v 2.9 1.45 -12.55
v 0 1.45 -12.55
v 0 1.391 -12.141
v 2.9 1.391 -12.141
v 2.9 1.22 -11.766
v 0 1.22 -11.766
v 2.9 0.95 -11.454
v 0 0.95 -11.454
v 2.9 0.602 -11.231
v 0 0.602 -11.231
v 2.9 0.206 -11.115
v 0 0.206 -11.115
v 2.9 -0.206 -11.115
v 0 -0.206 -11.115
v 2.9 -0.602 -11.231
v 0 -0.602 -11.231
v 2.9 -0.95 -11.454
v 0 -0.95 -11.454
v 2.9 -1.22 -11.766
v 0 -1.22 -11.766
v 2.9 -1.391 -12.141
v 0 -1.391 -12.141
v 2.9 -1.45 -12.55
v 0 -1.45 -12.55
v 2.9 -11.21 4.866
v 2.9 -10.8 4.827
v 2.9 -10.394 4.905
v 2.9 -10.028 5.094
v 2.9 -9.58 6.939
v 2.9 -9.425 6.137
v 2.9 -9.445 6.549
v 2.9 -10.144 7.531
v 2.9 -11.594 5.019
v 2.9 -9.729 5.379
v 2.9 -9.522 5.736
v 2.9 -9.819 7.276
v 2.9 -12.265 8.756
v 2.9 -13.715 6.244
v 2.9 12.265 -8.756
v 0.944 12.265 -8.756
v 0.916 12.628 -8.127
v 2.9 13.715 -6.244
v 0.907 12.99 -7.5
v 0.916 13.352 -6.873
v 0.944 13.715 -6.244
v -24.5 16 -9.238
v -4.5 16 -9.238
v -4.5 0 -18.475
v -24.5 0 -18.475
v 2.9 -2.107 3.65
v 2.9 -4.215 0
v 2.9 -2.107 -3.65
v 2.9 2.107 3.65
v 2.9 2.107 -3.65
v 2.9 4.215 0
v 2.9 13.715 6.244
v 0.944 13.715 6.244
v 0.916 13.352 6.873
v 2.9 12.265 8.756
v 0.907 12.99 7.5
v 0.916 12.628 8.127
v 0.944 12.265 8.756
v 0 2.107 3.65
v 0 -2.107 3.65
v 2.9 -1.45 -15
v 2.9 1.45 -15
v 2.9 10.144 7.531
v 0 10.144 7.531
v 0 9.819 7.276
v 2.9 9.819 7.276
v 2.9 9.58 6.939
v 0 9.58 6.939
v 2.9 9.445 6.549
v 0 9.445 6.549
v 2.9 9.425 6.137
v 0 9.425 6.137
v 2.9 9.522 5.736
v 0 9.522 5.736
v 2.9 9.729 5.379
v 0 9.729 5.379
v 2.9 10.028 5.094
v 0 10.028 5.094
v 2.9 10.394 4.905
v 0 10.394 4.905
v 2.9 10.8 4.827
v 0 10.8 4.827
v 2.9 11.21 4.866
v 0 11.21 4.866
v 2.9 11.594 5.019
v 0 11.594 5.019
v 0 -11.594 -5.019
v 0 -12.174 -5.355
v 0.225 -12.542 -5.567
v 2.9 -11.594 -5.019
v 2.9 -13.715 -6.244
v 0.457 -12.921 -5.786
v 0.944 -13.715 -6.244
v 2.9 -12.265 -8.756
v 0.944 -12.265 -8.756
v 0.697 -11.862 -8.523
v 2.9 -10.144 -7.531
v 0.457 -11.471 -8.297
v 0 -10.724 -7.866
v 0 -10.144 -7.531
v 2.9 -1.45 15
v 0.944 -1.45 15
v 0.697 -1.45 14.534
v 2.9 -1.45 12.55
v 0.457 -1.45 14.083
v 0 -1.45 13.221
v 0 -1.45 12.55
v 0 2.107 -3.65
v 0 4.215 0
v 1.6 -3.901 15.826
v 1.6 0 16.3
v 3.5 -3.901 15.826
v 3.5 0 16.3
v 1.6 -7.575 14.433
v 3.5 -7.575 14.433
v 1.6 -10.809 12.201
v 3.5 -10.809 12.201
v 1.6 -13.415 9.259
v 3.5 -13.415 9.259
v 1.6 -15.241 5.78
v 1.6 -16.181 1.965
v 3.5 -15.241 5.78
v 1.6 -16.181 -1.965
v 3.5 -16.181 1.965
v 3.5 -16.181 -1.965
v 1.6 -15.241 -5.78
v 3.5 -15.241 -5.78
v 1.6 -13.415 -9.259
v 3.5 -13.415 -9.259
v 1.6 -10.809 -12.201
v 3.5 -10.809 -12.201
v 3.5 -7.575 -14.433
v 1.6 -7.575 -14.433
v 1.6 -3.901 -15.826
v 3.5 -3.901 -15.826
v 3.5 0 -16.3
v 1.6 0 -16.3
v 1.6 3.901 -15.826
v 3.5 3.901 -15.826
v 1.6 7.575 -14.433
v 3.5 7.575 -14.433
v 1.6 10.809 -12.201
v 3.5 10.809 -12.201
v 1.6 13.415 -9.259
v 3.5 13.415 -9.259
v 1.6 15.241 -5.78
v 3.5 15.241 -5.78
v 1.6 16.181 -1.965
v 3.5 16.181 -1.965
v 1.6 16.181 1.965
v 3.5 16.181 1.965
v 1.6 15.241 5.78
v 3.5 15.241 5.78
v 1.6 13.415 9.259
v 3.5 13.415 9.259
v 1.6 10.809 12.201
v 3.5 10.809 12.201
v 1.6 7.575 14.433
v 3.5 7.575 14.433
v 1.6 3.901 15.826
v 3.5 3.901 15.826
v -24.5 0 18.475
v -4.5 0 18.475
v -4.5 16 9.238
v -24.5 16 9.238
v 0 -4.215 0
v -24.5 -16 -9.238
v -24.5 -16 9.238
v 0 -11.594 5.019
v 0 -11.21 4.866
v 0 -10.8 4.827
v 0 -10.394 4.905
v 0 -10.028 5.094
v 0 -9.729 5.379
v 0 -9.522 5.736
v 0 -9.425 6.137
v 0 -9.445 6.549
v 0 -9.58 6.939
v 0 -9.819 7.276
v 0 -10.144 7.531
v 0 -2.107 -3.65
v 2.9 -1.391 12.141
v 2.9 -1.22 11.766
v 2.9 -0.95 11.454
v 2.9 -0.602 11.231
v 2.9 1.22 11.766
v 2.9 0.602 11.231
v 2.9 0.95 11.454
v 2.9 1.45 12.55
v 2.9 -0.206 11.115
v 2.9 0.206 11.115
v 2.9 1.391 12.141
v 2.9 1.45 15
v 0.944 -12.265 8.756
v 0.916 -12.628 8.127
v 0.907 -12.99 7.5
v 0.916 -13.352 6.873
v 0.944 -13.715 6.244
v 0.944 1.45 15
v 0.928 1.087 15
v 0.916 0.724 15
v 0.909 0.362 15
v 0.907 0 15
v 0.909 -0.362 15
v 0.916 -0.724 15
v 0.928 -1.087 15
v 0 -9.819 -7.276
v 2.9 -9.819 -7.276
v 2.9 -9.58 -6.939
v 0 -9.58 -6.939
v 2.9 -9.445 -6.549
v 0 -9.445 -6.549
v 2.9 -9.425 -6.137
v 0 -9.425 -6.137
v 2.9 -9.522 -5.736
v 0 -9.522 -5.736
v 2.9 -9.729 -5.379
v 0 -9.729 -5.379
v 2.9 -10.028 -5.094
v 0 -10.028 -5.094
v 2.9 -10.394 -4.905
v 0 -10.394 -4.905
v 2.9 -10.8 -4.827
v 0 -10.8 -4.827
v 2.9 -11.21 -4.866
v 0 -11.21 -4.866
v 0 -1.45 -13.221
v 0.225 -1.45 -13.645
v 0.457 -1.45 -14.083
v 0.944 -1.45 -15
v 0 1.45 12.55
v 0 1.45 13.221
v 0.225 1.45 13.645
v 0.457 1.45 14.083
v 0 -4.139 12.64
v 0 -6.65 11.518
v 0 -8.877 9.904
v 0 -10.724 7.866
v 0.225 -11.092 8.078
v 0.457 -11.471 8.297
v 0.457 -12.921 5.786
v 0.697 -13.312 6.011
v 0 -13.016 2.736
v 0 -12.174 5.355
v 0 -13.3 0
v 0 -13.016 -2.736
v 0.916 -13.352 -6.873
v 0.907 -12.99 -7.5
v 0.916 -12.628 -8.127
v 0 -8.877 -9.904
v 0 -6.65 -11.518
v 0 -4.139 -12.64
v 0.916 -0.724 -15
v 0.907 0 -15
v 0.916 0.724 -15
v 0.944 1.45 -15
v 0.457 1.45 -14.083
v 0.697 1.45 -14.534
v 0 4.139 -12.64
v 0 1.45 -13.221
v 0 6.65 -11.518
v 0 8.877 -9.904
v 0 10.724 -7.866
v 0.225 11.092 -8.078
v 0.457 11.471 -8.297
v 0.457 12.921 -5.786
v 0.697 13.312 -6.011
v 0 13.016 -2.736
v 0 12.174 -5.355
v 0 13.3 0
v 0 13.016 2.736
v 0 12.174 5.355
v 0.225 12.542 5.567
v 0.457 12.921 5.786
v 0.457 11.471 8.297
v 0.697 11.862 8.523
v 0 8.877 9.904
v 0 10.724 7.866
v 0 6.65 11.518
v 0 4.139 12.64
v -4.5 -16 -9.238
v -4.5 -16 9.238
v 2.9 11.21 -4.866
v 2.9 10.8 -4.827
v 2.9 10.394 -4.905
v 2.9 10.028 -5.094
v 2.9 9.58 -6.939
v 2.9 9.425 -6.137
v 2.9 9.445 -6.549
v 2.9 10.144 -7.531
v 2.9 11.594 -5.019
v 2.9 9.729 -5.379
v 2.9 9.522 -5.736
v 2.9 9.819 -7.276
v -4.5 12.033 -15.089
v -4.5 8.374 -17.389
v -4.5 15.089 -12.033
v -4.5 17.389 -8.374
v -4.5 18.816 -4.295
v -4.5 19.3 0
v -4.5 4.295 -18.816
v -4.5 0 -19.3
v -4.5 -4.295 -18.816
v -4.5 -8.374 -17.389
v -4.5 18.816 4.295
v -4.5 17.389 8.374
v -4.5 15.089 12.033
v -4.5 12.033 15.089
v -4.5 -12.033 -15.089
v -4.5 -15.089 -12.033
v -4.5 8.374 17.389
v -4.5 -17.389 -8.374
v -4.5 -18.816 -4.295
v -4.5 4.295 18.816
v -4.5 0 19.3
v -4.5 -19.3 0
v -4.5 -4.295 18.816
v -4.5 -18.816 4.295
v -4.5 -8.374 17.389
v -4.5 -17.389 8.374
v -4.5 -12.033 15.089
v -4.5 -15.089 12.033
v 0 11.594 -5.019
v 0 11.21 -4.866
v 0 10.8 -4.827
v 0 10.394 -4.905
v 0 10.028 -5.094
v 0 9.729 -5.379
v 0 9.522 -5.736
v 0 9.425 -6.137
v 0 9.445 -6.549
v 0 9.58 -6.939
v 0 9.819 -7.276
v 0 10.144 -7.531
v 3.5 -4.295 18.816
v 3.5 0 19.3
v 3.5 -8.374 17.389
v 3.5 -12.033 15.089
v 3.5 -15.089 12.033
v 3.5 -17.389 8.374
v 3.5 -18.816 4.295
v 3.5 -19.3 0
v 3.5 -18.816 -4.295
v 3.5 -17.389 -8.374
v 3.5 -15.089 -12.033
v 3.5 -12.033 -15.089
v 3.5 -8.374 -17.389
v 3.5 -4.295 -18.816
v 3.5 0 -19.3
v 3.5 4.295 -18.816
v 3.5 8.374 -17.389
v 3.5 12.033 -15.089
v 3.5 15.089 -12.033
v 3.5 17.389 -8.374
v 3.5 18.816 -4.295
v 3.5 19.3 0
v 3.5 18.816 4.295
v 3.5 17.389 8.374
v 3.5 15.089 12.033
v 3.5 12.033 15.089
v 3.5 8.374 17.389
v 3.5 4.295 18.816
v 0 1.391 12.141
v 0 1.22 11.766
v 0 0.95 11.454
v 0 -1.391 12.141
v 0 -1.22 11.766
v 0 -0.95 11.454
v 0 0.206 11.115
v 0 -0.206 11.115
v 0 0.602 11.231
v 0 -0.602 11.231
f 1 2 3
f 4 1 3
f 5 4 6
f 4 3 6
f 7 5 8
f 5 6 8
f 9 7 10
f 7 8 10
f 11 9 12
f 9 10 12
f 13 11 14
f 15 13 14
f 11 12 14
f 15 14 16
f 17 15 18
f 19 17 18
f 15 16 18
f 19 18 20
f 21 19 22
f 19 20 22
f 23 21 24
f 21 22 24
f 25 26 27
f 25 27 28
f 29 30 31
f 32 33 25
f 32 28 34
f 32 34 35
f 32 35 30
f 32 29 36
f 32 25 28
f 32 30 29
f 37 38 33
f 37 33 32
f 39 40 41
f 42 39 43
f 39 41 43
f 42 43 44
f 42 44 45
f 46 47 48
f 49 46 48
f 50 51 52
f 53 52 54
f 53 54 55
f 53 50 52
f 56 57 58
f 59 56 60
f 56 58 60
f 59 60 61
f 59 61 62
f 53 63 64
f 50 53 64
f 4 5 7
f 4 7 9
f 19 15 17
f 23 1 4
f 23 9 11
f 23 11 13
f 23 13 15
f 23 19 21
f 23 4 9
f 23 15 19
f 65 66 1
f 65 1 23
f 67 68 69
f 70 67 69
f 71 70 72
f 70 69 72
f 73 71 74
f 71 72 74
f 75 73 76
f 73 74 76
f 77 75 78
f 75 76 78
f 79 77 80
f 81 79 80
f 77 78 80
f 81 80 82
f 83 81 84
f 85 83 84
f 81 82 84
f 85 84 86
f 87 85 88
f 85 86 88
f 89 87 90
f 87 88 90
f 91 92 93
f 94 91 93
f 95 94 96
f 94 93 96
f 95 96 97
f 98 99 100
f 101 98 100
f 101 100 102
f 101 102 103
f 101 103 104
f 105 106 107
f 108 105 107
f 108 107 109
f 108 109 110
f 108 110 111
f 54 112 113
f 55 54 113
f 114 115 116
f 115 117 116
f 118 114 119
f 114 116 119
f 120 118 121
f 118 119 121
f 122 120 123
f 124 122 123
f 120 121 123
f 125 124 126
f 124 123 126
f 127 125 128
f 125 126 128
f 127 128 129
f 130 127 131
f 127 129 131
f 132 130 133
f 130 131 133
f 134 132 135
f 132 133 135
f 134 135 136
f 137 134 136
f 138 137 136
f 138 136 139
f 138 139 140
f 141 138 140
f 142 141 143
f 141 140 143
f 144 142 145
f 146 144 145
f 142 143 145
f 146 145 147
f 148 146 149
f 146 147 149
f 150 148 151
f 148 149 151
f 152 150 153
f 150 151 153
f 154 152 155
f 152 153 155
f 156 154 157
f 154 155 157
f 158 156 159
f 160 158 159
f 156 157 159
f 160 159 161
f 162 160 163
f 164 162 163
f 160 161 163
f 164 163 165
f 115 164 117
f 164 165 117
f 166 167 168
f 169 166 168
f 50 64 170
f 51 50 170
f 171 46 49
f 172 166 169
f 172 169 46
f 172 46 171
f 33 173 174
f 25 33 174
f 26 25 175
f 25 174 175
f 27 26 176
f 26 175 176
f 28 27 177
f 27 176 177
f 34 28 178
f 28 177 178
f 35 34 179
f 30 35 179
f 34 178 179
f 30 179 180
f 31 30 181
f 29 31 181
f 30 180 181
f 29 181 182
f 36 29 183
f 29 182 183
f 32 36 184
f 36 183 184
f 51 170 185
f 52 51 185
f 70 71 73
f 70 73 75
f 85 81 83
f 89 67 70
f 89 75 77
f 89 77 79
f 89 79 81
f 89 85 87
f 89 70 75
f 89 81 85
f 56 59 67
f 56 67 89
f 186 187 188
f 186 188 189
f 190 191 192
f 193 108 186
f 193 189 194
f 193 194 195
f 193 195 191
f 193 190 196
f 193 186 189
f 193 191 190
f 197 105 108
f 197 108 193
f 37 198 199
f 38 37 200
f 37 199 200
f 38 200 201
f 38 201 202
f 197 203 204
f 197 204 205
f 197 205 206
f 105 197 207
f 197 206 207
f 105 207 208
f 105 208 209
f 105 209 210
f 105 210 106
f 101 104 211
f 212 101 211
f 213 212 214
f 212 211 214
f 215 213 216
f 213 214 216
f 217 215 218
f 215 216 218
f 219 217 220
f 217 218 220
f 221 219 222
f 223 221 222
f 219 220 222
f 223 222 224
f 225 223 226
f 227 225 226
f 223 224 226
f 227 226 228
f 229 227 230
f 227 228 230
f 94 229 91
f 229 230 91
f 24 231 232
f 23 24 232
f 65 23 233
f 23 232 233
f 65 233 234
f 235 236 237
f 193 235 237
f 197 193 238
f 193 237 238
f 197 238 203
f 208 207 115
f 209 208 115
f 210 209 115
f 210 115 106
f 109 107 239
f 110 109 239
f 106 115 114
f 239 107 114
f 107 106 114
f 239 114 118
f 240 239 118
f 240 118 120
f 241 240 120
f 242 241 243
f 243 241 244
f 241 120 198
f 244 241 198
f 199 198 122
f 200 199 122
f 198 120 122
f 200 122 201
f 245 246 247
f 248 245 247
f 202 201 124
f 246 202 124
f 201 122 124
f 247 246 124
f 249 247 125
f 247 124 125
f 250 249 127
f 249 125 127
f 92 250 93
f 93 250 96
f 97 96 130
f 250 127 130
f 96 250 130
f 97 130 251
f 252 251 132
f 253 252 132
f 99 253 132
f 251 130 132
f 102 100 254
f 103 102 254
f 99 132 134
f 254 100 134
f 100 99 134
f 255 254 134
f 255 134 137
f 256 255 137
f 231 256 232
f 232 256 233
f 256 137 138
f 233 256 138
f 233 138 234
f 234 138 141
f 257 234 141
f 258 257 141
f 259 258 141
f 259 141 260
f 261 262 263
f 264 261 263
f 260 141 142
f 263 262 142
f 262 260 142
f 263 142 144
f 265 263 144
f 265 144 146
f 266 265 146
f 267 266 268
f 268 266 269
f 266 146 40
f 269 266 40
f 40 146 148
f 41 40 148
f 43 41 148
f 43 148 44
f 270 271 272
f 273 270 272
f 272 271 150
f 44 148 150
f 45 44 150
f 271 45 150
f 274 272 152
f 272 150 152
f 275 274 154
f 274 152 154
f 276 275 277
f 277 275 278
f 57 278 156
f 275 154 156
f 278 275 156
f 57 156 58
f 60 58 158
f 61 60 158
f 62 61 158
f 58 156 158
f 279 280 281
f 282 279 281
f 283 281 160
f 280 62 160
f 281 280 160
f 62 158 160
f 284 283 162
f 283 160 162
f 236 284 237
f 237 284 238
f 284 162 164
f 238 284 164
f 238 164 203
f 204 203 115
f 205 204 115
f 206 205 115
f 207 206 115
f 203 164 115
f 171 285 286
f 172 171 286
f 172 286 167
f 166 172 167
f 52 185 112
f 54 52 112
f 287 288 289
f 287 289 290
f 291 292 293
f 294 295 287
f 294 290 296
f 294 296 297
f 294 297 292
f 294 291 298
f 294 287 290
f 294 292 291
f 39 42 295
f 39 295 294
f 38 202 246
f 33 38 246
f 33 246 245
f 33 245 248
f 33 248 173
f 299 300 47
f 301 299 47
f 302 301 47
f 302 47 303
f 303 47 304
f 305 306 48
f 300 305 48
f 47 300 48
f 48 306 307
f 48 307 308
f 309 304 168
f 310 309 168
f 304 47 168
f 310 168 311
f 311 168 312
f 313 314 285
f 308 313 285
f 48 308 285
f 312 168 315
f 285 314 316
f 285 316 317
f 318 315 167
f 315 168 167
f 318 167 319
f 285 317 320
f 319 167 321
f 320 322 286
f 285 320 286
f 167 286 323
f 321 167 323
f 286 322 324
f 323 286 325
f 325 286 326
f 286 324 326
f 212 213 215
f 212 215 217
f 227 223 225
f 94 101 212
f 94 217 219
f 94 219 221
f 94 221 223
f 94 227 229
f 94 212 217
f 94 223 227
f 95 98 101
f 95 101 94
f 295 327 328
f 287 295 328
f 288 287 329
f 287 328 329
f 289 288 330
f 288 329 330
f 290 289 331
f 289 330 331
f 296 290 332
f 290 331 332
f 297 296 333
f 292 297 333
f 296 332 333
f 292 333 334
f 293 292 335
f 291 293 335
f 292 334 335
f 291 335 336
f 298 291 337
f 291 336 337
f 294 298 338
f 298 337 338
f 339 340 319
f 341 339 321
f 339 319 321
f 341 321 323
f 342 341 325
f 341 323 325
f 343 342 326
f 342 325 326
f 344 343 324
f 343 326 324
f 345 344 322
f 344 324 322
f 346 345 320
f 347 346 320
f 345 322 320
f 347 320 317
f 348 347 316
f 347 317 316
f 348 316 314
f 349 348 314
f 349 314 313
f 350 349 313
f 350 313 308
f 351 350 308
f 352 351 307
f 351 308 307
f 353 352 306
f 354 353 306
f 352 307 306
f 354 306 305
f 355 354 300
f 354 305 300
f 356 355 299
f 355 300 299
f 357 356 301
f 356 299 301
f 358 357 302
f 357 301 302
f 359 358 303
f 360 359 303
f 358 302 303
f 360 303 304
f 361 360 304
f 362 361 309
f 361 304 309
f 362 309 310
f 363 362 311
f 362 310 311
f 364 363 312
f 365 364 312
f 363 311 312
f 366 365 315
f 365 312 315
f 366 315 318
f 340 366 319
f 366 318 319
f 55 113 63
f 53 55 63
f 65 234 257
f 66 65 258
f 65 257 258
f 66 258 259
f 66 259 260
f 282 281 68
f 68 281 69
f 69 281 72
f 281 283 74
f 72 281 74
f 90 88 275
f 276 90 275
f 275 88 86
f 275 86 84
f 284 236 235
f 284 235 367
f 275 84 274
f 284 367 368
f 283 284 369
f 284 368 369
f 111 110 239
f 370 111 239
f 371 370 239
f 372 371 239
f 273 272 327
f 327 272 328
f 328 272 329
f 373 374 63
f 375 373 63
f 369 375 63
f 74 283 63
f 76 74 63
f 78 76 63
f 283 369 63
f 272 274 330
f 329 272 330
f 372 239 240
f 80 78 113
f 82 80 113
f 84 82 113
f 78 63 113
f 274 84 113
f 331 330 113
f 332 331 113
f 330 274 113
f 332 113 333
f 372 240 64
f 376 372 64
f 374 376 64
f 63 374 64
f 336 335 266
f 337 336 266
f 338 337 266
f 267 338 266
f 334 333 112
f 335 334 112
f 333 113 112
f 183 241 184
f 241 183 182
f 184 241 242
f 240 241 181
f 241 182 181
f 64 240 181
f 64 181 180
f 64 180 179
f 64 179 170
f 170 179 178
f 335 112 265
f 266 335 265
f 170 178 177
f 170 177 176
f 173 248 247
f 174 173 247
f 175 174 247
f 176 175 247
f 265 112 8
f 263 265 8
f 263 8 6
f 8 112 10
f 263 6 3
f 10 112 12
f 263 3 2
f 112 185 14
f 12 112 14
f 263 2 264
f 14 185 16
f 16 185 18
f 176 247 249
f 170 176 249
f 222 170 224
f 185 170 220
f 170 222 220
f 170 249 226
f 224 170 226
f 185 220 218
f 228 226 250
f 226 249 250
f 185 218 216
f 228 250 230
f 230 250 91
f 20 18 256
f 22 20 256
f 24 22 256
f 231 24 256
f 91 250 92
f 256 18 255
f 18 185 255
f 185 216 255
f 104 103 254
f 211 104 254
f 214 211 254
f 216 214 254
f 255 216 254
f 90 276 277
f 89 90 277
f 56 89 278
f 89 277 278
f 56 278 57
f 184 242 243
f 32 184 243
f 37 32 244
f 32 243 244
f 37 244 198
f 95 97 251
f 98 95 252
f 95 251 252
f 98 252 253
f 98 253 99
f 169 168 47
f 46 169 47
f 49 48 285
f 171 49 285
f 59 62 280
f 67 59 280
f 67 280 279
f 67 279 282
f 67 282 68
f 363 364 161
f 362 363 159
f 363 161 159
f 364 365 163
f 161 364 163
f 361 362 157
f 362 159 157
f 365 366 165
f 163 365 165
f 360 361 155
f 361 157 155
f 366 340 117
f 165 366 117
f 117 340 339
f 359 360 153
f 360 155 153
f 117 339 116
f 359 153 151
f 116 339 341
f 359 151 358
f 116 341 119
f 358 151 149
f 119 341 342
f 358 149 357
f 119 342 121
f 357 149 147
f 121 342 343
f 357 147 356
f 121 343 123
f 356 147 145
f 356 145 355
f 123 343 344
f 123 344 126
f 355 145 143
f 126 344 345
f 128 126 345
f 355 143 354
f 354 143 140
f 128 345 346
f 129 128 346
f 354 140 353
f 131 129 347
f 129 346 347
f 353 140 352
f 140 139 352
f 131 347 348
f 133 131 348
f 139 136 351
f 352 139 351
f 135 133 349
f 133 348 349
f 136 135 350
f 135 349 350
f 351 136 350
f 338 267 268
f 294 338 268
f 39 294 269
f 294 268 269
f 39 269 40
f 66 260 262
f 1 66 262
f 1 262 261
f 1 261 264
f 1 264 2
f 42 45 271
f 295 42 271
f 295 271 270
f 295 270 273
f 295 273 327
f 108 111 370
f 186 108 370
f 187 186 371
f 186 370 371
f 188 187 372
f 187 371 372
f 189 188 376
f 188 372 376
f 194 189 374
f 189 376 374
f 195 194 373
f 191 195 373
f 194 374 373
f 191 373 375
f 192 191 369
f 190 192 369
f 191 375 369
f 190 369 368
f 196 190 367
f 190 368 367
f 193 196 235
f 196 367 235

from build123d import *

# Parameters (mm, degrees)
F3_DEPTH        = 2.9
F5_DEPTH        = 20
F7_DEPTH        = 2.9
F7_COPIES_COUNT = 6


# Not quite as in the source:
# - a pattern or mirror of a feature is missing from the dataset's text; its kind, count and spacing are read off the source's solid


with BuildPart() as f1:
    # F0 (on Front) → F1 (revolve)
    with BuildSketch(Plane.XZ):
        Polygon((1.6, 16.3), (3.5, 16.3), (3.5, 19.3), (-4.5, 19.3), (-4.5, 0), (0, 0), (0, 13.3), align=None)
    revolve(axis=Axis((15.3209697455, 0, 0), (1, 0, 0)))

    # F2 (on face) → F3 (join)
    with BuildSketch(Plane.YZ):
        Polygon((-2.1073284825, 3.65), (-4.2146569651, 0), (-2.1073284825, -3.65), (2.1073284825, -3.65), (4.2146569651, 0), (2.1073284825, 3.65), align=None)
    extrude(amount=F3_DEPTH)

    # F4 (on face) → F5 (join)
    with BuildSketch(Plane(origin=(-4.5, 0, 0), x_dir=(0, -1, 0), z_dir=(-1, 0, 0))):
        Polygon((0, 18.4752086141), (-16, 9.237604307), (-16, -9.237604307), (0, -18.4752086141), (16, -9.237604307), (16, 9.237604307), align=None)
    extrude(amount=F5_DEPTH)

    # F6 (on face) → F7 (join)
    with BuildSketch(Plane.YZ):
        with BuildLine():
            Line((1.45, 15), (-1.45, 15))
            Line((-1.45, 15), (-1.45, 12.55))
            ThreePointArc((-1.45, 12.55), (0, 11.1), (1.45, 12.55))
            Line((1.45, 12.55), (1.45, 15))
        make_face()
    f7 = extrude(amount=F7_DEPTH)

    # F7_copies: F7 ×6 about axis
    f7_copies_axis = Axis((0, 0, 0), (1, 0, 0))
    for i in range(1, F7_COPIES_COUNT):
        add(f7.rotate(f7_copies_axis, i * 360 / F7_COPIES_COUNT))


solid = f1.part
